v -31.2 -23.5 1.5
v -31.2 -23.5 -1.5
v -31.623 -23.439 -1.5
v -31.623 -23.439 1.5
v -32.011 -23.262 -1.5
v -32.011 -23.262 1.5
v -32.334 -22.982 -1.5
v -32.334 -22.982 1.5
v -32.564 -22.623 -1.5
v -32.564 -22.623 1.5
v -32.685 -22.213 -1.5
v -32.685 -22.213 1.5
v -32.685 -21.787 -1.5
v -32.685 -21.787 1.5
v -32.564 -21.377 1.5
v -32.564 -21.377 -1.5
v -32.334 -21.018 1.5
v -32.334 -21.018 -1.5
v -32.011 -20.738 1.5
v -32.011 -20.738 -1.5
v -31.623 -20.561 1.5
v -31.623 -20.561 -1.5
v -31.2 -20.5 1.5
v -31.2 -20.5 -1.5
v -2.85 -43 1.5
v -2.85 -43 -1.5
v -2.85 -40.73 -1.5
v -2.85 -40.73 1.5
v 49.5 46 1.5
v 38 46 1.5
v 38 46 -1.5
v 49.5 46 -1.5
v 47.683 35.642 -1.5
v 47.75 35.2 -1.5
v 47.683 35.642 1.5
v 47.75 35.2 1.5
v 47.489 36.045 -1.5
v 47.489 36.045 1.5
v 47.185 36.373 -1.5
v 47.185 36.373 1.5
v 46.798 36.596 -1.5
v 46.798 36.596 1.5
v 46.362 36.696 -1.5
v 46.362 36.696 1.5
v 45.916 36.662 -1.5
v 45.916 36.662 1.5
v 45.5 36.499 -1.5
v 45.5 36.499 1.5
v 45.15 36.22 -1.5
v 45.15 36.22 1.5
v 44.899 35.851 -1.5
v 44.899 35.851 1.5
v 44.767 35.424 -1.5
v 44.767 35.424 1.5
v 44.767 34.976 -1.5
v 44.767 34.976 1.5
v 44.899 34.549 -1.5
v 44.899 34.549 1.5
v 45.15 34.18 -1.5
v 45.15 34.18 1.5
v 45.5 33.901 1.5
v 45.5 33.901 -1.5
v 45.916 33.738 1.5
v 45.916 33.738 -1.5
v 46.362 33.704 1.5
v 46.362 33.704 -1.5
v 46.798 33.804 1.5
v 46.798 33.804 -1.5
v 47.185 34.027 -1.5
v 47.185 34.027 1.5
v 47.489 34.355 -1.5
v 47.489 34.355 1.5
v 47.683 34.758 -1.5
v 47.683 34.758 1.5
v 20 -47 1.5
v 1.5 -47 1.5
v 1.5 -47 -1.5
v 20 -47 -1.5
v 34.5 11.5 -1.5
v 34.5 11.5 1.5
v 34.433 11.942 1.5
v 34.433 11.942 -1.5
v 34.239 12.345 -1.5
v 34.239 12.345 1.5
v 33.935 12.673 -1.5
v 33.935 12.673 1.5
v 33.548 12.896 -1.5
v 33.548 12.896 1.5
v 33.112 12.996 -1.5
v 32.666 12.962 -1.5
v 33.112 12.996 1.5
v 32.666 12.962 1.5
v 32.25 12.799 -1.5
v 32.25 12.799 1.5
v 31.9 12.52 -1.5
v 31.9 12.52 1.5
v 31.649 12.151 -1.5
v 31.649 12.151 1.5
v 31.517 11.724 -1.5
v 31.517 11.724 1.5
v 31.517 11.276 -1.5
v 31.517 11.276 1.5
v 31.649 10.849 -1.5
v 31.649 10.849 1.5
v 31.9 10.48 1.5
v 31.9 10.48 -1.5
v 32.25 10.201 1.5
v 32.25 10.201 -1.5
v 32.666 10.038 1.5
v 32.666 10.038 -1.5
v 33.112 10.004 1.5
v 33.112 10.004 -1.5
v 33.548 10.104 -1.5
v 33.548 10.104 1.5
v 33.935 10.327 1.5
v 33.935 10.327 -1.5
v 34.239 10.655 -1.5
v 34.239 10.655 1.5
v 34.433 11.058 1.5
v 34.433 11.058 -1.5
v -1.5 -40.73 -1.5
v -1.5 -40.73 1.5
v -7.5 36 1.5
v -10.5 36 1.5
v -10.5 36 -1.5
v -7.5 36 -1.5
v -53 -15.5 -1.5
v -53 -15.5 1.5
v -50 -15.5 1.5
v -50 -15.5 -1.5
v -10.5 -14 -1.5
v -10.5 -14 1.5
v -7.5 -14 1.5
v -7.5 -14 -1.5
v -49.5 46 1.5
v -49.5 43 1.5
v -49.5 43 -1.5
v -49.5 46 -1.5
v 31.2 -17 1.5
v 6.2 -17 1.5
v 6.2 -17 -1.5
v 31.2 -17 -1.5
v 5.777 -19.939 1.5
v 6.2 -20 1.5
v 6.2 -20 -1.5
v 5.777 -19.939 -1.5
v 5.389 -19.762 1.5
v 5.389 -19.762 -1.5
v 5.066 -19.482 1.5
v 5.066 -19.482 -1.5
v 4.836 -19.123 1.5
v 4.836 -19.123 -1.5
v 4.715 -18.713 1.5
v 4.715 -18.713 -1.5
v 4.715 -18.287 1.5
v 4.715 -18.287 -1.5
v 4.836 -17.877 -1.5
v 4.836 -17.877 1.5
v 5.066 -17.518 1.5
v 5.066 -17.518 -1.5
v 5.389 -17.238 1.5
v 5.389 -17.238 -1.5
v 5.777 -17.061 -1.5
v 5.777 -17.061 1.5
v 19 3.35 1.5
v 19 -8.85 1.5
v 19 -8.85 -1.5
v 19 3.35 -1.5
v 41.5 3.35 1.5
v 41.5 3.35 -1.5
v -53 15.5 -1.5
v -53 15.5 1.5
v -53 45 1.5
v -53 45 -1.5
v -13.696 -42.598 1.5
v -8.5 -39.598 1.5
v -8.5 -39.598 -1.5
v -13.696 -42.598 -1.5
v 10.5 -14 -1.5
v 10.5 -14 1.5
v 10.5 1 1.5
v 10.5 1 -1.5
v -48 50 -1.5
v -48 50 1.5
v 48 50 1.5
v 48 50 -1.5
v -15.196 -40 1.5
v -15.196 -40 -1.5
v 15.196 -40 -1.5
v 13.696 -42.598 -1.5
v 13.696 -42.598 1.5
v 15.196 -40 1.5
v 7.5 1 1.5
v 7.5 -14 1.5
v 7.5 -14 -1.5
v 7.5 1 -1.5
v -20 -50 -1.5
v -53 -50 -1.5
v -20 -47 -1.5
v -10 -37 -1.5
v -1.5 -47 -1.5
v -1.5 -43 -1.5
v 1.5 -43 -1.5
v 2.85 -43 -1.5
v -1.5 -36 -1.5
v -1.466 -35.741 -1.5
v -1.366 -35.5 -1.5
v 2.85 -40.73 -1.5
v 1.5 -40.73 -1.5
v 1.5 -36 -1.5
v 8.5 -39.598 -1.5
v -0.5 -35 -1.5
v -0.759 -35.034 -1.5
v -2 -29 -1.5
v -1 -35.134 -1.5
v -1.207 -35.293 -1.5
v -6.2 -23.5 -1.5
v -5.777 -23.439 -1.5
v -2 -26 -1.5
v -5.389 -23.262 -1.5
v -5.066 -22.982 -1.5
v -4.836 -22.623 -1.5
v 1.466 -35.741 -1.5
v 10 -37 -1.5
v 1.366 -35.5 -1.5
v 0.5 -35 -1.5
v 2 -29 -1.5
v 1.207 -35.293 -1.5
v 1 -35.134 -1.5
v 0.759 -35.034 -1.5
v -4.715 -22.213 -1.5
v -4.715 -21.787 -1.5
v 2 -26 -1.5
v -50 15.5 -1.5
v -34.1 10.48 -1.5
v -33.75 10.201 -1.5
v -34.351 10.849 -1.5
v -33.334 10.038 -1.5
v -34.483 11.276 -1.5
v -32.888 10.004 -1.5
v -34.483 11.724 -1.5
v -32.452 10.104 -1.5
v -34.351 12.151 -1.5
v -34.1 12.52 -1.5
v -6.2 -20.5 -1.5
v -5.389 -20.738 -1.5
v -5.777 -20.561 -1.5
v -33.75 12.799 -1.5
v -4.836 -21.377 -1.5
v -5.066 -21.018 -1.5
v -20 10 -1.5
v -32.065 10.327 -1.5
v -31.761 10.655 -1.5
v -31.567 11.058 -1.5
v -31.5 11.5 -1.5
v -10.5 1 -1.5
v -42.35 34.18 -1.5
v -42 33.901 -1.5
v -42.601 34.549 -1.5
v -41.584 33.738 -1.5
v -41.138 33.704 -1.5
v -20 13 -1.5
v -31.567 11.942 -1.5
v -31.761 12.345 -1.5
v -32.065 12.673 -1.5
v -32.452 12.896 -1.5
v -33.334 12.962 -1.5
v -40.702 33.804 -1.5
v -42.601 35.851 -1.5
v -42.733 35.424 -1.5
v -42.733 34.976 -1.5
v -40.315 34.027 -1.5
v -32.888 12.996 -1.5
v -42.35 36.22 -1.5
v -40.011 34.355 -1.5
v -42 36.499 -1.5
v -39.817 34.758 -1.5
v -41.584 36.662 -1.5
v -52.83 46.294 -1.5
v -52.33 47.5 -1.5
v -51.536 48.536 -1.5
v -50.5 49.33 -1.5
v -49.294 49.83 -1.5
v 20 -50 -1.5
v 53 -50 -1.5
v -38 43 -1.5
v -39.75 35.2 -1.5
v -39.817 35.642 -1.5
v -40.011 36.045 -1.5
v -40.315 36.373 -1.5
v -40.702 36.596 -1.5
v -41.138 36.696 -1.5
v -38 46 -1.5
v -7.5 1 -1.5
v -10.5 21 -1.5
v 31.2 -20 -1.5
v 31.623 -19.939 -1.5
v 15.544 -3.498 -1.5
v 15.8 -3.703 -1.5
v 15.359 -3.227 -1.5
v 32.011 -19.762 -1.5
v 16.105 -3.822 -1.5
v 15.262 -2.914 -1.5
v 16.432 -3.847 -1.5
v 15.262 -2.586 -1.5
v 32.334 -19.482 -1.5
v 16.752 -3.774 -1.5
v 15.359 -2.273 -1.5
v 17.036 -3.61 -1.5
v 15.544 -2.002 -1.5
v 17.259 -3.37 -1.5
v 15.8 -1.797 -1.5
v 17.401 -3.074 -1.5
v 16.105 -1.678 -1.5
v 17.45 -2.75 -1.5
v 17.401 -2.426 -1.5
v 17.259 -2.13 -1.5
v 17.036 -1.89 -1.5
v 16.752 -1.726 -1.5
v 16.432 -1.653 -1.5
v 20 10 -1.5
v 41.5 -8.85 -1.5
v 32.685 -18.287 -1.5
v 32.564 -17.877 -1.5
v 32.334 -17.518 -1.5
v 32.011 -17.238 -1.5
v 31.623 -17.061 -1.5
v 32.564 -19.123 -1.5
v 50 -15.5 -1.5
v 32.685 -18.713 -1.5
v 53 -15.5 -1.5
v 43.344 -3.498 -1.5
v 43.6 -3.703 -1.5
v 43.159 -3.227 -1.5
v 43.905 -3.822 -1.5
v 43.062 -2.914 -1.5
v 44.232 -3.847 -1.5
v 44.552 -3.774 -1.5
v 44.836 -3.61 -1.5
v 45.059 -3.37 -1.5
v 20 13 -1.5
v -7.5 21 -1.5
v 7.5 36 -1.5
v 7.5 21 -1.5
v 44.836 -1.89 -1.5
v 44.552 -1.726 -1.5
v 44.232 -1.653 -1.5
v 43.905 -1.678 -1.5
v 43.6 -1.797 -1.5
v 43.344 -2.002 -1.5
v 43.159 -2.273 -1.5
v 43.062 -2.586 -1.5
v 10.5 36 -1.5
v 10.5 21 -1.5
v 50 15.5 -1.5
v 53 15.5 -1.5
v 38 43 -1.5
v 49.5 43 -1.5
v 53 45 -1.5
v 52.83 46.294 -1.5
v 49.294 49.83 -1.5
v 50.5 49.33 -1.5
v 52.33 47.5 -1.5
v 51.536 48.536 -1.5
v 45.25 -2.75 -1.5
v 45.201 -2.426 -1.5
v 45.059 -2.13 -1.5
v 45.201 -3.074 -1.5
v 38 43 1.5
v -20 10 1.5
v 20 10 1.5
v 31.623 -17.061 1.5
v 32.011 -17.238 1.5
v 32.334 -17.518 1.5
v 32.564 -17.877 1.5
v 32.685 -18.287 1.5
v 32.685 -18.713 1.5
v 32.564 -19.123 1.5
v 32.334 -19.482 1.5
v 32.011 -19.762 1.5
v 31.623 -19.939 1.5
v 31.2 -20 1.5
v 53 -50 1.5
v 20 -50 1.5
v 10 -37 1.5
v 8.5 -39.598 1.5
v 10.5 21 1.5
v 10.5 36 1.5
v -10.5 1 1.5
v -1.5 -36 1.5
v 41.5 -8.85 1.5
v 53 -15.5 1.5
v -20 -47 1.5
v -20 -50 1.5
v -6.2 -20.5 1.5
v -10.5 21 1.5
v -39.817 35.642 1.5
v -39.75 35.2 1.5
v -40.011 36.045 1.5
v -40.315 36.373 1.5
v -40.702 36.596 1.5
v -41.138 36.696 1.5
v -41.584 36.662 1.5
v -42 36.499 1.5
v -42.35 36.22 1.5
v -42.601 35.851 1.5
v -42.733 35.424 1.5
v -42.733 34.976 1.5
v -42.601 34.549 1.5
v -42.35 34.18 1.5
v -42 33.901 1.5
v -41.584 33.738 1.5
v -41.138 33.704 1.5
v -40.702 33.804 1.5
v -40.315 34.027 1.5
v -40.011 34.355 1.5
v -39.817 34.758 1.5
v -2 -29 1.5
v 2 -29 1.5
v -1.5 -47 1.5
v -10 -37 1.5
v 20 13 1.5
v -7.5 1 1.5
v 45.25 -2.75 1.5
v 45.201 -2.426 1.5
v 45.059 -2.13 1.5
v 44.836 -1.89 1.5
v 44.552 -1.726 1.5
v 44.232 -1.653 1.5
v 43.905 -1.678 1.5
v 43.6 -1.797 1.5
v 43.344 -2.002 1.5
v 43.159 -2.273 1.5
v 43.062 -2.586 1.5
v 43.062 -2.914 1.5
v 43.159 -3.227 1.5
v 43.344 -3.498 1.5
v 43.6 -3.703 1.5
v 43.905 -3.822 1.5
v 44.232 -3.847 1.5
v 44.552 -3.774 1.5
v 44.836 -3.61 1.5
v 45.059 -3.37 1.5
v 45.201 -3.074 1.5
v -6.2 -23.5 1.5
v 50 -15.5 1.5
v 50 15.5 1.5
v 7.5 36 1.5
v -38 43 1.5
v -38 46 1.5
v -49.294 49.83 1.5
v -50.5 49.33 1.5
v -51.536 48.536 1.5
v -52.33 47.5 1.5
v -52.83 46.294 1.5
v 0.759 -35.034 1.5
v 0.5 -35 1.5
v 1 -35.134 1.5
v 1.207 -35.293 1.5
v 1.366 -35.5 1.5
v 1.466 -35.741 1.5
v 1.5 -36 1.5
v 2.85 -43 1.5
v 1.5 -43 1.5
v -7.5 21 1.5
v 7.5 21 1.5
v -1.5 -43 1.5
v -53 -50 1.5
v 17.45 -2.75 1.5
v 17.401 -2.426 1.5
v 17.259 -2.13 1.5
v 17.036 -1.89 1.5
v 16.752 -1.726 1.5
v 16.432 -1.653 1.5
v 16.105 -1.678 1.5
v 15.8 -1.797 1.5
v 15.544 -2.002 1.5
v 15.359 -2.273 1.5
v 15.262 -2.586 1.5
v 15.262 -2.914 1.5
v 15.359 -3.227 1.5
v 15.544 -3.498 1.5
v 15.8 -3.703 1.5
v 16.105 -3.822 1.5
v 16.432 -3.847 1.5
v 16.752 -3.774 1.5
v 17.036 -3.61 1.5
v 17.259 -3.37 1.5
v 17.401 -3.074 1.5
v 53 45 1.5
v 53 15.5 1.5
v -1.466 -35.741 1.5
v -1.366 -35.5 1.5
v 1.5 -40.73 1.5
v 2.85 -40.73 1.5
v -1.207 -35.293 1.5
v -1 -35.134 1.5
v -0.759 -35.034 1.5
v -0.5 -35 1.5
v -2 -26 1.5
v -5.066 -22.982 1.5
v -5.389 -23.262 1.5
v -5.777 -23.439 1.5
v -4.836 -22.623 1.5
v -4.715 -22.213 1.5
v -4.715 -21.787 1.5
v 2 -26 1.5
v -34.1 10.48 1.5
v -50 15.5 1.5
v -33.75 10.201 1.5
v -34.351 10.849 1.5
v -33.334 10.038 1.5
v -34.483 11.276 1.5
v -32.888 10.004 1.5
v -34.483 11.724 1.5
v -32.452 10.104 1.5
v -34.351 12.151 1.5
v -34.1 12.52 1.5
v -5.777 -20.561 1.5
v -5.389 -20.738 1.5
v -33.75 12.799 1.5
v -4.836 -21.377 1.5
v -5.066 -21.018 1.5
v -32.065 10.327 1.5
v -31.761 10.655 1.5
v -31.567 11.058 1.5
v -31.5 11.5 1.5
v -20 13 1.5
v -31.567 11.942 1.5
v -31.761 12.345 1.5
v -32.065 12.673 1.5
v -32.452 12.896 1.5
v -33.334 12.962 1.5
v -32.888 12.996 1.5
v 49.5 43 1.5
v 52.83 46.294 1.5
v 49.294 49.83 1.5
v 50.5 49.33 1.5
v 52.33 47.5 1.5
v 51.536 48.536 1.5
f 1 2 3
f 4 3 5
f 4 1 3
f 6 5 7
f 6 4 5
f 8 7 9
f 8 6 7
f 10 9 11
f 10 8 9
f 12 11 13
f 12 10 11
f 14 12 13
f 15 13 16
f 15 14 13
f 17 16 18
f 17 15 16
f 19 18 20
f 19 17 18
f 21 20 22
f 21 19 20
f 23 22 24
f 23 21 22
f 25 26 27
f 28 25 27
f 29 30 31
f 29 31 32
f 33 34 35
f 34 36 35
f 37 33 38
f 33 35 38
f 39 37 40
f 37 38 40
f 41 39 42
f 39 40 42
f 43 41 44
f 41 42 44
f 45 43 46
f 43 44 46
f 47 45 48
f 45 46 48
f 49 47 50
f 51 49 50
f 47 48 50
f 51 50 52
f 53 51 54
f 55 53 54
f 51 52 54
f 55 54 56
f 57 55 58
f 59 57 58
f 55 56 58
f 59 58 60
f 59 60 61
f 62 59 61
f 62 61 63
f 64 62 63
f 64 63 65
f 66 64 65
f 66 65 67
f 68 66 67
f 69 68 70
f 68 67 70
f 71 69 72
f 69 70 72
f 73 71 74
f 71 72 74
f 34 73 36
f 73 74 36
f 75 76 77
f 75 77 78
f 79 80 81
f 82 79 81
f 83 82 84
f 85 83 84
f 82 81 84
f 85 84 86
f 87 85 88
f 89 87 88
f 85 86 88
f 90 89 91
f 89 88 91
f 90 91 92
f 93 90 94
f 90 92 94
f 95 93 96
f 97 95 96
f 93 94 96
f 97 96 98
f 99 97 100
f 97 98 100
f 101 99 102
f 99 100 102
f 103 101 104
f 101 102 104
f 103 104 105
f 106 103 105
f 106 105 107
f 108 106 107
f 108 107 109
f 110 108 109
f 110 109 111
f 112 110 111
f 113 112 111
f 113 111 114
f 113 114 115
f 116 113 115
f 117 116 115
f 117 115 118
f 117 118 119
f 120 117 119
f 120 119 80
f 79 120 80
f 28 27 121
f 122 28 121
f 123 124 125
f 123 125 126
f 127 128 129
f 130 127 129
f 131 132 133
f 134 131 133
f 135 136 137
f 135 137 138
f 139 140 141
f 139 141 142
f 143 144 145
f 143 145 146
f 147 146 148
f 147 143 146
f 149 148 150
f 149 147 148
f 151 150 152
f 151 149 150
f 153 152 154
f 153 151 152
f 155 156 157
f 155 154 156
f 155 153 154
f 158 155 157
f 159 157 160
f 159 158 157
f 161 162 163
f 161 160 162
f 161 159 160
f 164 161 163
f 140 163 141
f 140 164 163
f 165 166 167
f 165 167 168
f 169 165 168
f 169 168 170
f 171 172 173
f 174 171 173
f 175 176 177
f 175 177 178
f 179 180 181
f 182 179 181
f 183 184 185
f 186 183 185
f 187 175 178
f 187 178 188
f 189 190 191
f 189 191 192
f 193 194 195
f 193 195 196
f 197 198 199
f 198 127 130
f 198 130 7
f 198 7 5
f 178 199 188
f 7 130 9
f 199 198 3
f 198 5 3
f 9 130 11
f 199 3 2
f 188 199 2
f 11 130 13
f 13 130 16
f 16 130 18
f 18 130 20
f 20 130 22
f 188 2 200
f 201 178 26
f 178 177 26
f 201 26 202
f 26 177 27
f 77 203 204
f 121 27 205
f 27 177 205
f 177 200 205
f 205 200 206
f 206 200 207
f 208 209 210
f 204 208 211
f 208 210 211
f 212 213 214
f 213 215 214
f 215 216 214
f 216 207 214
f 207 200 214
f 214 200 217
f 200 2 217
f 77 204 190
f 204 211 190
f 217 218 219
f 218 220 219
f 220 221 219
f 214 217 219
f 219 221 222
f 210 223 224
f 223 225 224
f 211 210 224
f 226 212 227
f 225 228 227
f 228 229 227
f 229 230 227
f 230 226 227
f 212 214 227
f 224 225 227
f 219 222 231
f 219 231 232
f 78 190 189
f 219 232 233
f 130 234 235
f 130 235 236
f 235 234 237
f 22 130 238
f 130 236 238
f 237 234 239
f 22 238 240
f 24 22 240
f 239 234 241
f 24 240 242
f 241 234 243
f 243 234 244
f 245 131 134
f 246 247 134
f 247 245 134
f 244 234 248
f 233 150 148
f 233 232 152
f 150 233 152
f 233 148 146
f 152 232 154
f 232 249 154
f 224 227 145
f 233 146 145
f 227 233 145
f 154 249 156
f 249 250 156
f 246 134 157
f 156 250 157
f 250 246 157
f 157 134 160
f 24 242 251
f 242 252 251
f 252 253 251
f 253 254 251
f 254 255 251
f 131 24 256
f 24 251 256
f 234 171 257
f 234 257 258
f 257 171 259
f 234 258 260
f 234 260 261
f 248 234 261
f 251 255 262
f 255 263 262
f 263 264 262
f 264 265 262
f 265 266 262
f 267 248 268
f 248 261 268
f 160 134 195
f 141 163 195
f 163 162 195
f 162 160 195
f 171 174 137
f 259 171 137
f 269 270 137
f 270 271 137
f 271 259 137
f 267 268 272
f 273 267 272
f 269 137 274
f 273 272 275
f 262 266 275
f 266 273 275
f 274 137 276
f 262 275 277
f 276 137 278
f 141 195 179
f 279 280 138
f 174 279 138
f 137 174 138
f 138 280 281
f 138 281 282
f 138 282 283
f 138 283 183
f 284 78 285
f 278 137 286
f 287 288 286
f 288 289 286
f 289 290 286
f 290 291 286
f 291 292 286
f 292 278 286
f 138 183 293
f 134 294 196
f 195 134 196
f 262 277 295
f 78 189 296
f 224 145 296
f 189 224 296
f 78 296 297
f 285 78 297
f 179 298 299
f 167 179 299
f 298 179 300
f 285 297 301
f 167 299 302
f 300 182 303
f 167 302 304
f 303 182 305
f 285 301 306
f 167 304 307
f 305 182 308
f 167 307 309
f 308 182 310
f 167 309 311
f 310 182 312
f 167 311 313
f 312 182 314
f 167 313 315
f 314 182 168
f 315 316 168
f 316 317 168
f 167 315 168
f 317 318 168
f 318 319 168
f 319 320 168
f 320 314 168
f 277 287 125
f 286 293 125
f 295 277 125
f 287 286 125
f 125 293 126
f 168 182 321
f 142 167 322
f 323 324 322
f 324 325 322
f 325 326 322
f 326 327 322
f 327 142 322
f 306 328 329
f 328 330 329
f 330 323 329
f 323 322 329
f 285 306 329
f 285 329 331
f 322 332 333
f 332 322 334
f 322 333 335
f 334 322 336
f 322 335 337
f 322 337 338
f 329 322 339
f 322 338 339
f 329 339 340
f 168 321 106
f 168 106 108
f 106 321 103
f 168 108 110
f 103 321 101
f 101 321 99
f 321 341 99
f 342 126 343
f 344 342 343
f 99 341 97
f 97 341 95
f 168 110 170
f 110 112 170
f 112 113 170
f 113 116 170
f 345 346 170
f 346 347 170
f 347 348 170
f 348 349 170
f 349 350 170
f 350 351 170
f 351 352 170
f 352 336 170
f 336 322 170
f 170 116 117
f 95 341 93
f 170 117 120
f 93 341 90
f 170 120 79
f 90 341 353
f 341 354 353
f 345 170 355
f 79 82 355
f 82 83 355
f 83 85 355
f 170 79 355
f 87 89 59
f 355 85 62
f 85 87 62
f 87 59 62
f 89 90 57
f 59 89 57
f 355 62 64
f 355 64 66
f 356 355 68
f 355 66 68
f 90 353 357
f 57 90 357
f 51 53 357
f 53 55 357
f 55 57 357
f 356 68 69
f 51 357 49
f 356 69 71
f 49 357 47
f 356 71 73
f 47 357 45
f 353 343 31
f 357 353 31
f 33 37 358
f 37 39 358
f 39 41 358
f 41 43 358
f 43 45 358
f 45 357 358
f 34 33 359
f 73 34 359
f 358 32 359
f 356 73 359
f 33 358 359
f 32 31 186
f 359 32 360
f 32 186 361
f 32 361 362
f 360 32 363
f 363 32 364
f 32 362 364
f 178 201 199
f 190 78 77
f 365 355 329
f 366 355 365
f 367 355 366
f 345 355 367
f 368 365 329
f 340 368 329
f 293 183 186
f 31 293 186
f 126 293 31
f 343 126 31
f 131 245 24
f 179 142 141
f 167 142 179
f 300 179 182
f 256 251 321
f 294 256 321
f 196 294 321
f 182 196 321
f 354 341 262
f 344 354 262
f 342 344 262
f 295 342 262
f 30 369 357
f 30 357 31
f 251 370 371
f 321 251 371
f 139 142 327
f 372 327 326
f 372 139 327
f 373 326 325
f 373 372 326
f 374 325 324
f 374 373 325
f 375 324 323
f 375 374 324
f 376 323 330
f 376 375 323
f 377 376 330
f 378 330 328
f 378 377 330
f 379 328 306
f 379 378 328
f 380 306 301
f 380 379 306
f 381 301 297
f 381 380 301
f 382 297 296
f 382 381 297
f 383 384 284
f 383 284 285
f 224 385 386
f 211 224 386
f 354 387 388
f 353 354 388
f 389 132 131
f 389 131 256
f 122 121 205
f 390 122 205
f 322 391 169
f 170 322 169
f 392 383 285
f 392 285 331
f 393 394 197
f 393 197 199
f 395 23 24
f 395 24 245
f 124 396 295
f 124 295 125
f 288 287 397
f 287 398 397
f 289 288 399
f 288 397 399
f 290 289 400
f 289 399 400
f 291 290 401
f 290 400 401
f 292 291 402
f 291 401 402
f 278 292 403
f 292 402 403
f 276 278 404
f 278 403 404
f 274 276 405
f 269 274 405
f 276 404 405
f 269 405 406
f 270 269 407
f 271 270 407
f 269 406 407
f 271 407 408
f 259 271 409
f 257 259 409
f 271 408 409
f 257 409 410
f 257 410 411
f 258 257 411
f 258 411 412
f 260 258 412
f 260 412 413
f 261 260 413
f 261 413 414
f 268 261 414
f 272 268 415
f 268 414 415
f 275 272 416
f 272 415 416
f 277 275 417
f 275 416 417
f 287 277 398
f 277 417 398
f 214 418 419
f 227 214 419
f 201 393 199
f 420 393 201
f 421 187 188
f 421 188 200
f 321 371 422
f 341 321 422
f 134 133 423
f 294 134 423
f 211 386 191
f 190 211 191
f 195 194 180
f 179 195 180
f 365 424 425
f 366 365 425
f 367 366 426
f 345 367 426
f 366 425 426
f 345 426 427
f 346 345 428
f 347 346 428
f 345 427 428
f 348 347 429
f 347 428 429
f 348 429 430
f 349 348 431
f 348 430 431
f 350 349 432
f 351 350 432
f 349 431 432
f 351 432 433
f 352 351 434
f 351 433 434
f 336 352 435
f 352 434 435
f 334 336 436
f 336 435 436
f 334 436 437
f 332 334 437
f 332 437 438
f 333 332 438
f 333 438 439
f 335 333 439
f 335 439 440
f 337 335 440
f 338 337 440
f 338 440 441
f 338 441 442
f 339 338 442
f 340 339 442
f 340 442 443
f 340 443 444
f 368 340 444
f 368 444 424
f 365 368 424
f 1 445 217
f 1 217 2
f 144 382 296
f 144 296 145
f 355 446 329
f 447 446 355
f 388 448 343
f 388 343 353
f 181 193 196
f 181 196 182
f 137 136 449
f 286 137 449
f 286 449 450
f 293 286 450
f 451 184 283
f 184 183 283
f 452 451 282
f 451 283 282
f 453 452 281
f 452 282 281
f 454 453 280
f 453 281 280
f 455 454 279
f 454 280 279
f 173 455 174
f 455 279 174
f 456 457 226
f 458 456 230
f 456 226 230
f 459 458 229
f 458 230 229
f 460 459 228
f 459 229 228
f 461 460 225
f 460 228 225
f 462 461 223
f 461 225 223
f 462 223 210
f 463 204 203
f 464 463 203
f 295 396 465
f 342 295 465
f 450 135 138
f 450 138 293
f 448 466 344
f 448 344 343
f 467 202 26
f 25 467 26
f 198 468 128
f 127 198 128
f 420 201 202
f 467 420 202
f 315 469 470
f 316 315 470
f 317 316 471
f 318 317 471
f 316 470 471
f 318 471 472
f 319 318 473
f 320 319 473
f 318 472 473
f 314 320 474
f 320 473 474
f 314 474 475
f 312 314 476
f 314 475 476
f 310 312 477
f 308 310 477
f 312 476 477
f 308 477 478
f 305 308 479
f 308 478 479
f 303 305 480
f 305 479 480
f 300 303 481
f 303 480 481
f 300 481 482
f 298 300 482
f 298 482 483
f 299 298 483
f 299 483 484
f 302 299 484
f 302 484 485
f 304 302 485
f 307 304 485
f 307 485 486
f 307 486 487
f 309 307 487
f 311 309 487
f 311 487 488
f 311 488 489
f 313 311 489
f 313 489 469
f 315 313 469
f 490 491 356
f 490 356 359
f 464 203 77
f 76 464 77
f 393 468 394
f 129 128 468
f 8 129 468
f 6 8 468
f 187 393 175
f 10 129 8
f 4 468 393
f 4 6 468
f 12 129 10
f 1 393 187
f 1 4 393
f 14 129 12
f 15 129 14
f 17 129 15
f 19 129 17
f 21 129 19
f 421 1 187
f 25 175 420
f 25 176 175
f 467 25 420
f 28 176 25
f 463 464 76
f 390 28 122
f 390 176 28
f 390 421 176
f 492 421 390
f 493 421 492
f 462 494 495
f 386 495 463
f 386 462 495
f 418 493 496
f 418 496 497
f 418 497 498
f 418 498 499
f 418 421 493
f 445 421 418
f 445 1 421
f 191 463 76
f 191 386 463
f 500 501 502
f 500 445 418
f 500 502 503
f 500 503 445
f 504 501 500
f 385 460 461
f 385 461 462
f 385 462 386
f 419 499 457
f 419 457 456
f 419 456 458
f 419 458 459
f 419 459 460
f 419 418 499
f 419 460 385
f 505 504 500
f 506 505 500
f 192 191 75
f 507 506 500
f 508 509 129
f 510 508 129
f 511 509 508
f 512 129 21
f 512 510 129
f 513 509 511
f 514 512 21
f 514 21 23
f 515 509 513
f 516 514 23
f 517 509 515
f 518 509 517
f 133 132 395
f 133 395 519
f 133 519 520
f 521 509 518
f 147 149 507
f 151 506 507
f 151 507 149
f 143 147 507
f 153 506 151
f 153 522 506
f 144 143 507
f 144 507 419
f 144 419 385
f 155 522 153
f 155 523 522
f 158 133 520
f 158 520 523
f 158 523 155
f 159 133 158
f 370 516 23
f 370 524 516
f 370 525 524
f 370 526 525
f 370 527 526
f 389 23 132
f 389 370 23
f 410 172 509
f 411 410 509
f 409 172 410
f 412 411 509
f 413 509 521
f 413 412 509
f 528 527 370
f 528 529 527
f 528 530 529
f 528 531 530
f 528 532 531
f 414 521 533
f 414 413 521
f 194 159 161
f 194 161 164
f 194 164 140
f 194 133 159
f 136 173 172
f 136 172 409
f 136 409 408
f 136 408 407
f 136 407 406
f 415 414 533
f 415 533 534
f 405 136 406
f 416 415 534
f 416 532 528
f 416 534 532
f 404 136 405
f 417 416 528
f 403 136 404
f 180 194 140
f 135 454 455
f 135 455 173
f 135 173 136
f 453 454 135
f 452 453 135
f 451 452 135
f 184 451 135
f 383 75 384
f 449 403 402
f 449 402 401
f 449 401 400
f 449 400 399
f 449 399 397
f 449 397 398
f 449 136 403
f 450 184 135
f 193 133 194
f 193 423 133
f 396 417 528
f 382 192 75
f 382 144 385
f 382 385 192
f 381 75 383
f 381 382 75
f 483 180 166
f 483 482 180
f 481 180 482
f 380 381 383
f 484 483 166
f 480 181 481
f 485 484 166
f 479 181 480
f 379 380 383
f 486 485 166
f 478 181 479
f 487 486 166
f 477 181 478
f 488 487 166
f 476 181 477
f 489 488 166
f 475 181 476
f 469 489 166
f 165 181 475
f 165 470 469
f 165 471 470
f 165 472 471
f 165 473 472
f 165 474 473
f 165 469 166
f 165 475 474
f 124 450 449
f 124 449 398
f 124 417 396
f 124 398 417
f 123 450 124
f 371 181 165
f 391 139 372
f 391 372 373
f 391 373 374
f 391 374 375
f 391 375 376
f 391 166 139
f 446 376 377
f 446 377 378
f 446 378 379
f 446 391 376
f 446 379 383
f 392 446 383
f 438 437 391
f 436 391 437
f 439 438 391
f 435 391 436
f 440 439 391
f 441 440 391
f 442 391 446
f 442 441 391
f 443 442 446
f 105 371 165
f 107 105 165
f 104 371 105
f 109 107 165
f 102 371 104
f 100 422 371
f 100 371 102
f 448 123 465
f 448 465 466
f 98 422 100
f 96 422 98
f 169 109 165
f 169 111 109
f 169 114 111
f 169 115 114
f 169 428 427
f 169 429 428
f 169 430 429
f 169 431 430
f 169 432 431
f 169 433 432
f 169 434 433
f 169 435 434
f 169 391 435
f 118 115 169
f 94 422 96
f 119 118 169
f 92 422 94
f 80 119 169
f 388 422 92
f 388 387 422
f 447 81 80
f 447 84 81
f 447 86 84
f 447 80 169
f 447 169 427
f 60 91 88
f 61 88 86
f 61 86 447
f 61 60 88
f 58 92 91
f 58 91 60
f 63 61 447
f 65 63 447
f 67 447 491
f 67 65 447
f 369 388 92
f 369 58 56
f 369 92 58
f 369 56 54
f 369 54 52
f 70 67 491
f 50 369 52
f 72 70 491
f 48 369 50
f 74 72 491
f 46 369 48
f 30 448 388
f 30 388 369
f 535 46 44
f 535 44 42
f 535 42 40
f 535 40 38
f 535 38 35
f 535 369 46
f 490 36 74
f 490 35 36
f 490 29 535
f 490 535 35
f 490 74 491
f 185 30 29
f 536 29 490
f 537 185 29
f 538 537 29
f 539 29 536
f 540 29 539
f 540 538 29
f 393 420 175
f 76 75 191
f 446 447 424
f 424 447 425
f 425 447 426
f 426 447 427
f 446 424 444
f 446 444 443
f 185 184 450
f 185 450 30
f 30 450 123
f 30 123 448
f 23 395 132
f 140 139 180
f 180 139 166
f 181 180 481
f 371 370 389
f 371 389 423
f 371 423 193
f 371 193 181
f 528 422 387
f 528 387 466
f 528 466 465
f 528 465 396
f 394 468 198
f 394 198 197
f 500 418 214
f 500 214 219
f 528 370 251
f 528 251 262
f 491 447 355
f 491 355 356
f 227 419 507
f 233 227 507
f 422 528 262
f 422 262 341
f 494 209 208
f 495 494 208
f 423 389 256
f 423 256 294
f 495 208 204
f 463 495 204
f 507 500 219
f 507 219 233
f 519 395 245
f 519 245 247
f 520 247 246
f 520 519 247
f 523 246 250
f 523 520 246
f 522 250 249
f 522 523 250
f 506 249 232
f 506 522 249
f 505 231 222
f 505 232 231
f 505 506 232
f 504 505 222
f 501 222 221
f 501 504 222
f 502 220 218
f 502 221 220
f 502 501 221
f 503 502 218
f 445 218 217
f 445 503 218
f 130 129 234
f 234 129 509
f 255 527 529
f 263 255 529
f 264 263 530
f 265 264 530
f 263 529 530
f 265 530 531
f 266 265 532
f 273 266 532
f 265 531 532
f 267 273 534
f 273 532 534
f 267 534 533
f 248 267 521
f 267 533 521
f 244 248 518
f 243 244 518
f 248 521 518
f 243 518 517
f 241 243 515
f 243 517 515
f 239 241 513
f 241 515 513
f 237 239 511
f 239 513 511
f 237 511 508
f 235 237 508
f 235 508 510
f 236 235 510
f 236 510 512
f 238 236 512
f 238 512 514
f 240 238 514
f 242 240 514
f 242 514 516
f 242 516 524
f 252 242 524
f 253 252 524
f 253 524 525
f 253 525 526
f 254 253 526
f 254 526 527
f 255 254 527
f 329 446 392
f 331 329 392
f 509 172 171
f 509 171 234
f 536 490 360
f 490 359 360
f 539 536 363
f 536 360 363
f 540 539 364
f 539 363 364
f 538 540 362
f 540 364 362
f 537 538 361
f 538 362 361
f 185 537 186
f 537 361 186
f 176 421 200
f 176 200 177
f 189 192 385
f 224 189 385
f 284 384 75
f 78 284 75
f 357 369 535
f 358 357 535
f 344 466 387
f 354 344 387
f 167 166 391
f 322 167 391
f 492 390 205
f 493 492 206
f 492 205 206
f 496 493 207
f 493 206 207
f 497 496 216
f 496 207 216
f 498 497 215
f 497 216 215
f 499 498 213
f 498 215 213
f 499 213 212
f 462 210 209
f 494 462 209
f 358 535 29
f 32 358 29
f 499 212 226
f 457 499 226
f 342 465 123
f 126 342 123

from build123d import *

# Parameters (mm, degrees)
ESBO_O1_W                 = 100
ESBO_O1_H                 = 100
RESSALTO_EXTRUS_O1_DEPTH  = 1.5
ESBO_O2_R                 = 1.5
ESBO_O2_W                 = 40
ESBO_O2_H                 = 3
CORTE_EXTRUS_O1_DEPTH     = 4
ESBO_O3_W                 = 3
ESBO_O3_H                 = 34.5
RESSALTO_EXTRUS_O2_DEPTH  = 3
CUT_EXTRUDE4_DEPTH        = 2.5
CUT_EXTRUDE4_DEPTH_BACK   = 2.5
FILLET1_R                 = 5
SKETCH3_W                 = 3
SKETCH3_H                 = 15
SKETCH3_W_2               = 4
SKETCH3_H_2               = 3
CUT_EXTRUDE5_DEPTH        = 2.5
CUT_EXTRUDE5_DEPTH_BACK   = 2.5
SKETCH8_R                 = 1.5
SKETCH8_W                 = 11.5
SKETCH8_H                 = 3
CORTE_GY_53LDK_DEPTH      = 2.5
CORTE_GY_53LDK_DEPTH_BACK = 2.5
SKETCH4_R                 = 1.1
SKETCH4_W                 = 22.5
SKETCH4_H                 = 12.2
CUT_EXTRUDE6_DEPTH        = 1
CUT_EXTRUDE6_DEPTH_BACK   = 4
CUT_EXTRUDE7_DEPTH        = 1
CUT_EXTRUDE7_DEPTH_BACK   = 4


with BuildPart() as part:
    # Esboço1 → Ressalto-extrusão1 (new body, symmetric)
    with BuildSketch(Plane.XY):
        Rectangle(ESBO_O1_W, ESBO_O1_H)
    extrude(amount=RESSALTO_EXTRUS_O1_DEPTH, both=True)

    # Esboço2 → Corte-extrusão1 (cut, through all)
    with BuildSketch(Plane.XY.offset(1.5)):
        with Locations((-33, 11.5)):
            Circle(ESBO_O2_R)
        with Locations((33, 11.5)):
            Circle(ESBO_O2_R)
        with Locations((0, -48.5)):
            Rectangle(ESBO_O2_W, ESBO_O2_H)
        with Locations((0, 11.5)):
            Rectangle(ESBO_O2_W, ESBO_O2_H)
    extrude(amount=-CORTE_EXTRUS_O1_DEPTH, mode=Mode.SUBTRACT)

    # Esboço3 → Ressalto-extrusão2 (add, through all)
    with BuildSketch(Plane.XY.offset(1.5)):
        with Locations((-51.5, -32.75)):
            Rectangle(ESBO_O3_W, ESBO_O3_H)
        with Locations((51.5, -32.75)):
            Rectangle(ESBO_O3_W, ESBO_O3_H)
        with Locations((-51.5, 32.75)):
            Rectangle(ESBO_O3_W, ESBO_O3_H)
        with Locations((51.5, 32.75)):
            Rectangle(ESBO_O3_W, ESBO_O3_H)
    extrude(amount=-RESSALTO_EXTRUS_O2_DEPTH)

    # Sketch2 → Cut-Extrude4 (cut, two sides)
    with BuildSketch(Plane.XY) as cut_extrude4_sk:
        with BuildLine():
            Line((-0.5, -35), (0.5, -35))
            ThreePointArc((0.5, -35), (1.207106781, -35.292893219), (1.5, -36))
            Line((1.5, -36), (1.5, -40.73))
            Line((1.5, -40.73), (2.85, -40.73))
            Line((2.85, -40.73), (2.85, -43))
            Line((2.85, -43), (1.5, -43))
            Line((1.5, -43), (1.5, -47))
            Line((1.5, -47), (-1.5, -47))
            Line((-1.5, -47), (-1.5, -43))
            Line((-1.5, -43), (-2.85, -43))
            Line((-2.85, -43), (-2.85, -40.73))
            Line((-2.85, -40.73), (-1.5, -40.73))
            Line((-1.5, -40.73), (-1.5, -36))
            ThreePointArc((-1.5, -36), (-1.207106781, -35.292893219), (-0.5, -35))
        make_face()
    extrude(amount=CUT_EXTRUDE4_DEPTH, mode=Mode.SUBTRACT)
    extrude(cut_extrude4_sk.sketch, amount=-CUT_EXTRUDE4_DEPTH_BACK, mode=Mode.SUBTRACT)

    # Fillet1
    fillet1_edges = [part.edges().sort_by_distance(p)[0] for p in [
        (53, 50, 0),
        (-53, 50, 0),
    ]]
    fillet(fillet1_edges, radius=FILLET1_R)

    # Sketch3 → Cut-Extrude5 (cut, two sides)
    with BuildSketch(Plane.XY) as cut_extrude5_sk:
        with Locations((9, -6.5)):
            Rectangle(SKETCH3_W, SKETCH3_H)
        with Locations((9, 28.5)):
            Rectangle(SKETCH3_W, SKETCH3_H)
        with Locations((-9, 28.5)):
            Rectangle(SKETCH3_W, SKETCH3_H)
        with Locations((-9, -6.5)):
            Rectangle(SKETCH3_W, SKETCH3_H)
        with Locations((0, -27.5)):
            Rectangle(SKETCH3_W_2, SKETCH3_H_2)
        Polygon((-15.196152423, -40), (-10, -37), (-8.5, -39.598076211), (-13.696152423, -42.598076211), align=None)
        Polygon((10, -37), (8.5, -39.598076211), (13.696152423, -42.598076211), (15.196152423, -40), align=None)
    extrude(amount=CUT_EXTRUDE5_DEPTH, mode=Mode.SUBTRACT)
    extrude(cut_extrude5_sk.sketch, amount=-CUT_EXTRUDE5_DEPTH_BACK, mode=Mode.SUBTRACT)

    # Sketch8 → Corte GY-53LDK (cut, two sides)
    with BuildSketch(Plane.XY) as corte_gy_53ldk_sk:
        with Locations((-41.25, 35.2)):
            Circle(SKETCH8_R)
        with Locations((46.25, 35.2)):
            Circle(SKETCH8_R)
        with Locations((-43.75, 44.5)):
            Rectangle(SKETCH8_W, SKETCH8_H)
        with Locations((43.75, 44.5)):
            Rectangle(SKETCH8_W, SKETCH8_H)
    extrude(amount=CORTE_GY_53LDK_DEPTH, mode=Mode.SUBTRACT)
    extrude(corte_gy_53ldk_sk.sketch, amount=-CORTE_GY_53LDK_DEPTH_BACK, mode=Mode.SUBTRACT)

    # Sketch4 → Cut-Extrude6 (cut, two sides)
    with BuildSketch(Plane.XY.offset(1.5)) as cut_extrude6_sk:
        with Locations((44.15, -2.75)):
            Circle(SKETCH4_R)
        with Locations((16.35, -2.75)):
            Circle(SKETCH4_R)
        with Locations((30.25, -2.75)):
            Rectangle(SKETCH4_W, SKETCH4_H)
    extrude(amount=CUT_EXTRUDE6_DEPTH, mode=Mode.SUBTRACT)
    extrude(cut_extrude6_sk.sketch, amount=-CUT_EXTRUDE6_DEPTH_BACK, mode=Mode.SUBTRACT)

    # Sketch6 → Cut-Extrude7 (cut, two sides)
    with BuildSketch(Plane.XY.offset(1.5)) as cut_extrude7_sk:
        with BuildLine():
            Line((-31.2, -20.5), (-6.2, -20.5))
            ThreePointArc((-6.2, -20.5), (-4.7, -22), (-6.2, -23.5))
            Line((-6.2, -23.5), (-31.2, -23.5))
            ThreePointArc((-31.2, -23.5), (-32.7, -22), (-31.2, -20.5))
        make_face()
        with BuildLine():
            Line((6.2, -17), (31.2, -17))
            ThreePointArc((31.2, -17), (32.7, -18.5), (31.2, -20))
            Line((31.2, -20), (6.2, -20))
            ThreePointArc((6.2, -20), (4.7, -18.5), (6.2, -17))
        make_face()
    extrude(amount=CUT_EXTRUDE7_DEPTH, mode=Mode.SUBTRACT)
    extrude(cut_extrude7_sk.sketch, amount=-CUT_EXTRUDE7_DEPTH_BACK, mode=Mode.SUBTRACT)


solid = part.part
